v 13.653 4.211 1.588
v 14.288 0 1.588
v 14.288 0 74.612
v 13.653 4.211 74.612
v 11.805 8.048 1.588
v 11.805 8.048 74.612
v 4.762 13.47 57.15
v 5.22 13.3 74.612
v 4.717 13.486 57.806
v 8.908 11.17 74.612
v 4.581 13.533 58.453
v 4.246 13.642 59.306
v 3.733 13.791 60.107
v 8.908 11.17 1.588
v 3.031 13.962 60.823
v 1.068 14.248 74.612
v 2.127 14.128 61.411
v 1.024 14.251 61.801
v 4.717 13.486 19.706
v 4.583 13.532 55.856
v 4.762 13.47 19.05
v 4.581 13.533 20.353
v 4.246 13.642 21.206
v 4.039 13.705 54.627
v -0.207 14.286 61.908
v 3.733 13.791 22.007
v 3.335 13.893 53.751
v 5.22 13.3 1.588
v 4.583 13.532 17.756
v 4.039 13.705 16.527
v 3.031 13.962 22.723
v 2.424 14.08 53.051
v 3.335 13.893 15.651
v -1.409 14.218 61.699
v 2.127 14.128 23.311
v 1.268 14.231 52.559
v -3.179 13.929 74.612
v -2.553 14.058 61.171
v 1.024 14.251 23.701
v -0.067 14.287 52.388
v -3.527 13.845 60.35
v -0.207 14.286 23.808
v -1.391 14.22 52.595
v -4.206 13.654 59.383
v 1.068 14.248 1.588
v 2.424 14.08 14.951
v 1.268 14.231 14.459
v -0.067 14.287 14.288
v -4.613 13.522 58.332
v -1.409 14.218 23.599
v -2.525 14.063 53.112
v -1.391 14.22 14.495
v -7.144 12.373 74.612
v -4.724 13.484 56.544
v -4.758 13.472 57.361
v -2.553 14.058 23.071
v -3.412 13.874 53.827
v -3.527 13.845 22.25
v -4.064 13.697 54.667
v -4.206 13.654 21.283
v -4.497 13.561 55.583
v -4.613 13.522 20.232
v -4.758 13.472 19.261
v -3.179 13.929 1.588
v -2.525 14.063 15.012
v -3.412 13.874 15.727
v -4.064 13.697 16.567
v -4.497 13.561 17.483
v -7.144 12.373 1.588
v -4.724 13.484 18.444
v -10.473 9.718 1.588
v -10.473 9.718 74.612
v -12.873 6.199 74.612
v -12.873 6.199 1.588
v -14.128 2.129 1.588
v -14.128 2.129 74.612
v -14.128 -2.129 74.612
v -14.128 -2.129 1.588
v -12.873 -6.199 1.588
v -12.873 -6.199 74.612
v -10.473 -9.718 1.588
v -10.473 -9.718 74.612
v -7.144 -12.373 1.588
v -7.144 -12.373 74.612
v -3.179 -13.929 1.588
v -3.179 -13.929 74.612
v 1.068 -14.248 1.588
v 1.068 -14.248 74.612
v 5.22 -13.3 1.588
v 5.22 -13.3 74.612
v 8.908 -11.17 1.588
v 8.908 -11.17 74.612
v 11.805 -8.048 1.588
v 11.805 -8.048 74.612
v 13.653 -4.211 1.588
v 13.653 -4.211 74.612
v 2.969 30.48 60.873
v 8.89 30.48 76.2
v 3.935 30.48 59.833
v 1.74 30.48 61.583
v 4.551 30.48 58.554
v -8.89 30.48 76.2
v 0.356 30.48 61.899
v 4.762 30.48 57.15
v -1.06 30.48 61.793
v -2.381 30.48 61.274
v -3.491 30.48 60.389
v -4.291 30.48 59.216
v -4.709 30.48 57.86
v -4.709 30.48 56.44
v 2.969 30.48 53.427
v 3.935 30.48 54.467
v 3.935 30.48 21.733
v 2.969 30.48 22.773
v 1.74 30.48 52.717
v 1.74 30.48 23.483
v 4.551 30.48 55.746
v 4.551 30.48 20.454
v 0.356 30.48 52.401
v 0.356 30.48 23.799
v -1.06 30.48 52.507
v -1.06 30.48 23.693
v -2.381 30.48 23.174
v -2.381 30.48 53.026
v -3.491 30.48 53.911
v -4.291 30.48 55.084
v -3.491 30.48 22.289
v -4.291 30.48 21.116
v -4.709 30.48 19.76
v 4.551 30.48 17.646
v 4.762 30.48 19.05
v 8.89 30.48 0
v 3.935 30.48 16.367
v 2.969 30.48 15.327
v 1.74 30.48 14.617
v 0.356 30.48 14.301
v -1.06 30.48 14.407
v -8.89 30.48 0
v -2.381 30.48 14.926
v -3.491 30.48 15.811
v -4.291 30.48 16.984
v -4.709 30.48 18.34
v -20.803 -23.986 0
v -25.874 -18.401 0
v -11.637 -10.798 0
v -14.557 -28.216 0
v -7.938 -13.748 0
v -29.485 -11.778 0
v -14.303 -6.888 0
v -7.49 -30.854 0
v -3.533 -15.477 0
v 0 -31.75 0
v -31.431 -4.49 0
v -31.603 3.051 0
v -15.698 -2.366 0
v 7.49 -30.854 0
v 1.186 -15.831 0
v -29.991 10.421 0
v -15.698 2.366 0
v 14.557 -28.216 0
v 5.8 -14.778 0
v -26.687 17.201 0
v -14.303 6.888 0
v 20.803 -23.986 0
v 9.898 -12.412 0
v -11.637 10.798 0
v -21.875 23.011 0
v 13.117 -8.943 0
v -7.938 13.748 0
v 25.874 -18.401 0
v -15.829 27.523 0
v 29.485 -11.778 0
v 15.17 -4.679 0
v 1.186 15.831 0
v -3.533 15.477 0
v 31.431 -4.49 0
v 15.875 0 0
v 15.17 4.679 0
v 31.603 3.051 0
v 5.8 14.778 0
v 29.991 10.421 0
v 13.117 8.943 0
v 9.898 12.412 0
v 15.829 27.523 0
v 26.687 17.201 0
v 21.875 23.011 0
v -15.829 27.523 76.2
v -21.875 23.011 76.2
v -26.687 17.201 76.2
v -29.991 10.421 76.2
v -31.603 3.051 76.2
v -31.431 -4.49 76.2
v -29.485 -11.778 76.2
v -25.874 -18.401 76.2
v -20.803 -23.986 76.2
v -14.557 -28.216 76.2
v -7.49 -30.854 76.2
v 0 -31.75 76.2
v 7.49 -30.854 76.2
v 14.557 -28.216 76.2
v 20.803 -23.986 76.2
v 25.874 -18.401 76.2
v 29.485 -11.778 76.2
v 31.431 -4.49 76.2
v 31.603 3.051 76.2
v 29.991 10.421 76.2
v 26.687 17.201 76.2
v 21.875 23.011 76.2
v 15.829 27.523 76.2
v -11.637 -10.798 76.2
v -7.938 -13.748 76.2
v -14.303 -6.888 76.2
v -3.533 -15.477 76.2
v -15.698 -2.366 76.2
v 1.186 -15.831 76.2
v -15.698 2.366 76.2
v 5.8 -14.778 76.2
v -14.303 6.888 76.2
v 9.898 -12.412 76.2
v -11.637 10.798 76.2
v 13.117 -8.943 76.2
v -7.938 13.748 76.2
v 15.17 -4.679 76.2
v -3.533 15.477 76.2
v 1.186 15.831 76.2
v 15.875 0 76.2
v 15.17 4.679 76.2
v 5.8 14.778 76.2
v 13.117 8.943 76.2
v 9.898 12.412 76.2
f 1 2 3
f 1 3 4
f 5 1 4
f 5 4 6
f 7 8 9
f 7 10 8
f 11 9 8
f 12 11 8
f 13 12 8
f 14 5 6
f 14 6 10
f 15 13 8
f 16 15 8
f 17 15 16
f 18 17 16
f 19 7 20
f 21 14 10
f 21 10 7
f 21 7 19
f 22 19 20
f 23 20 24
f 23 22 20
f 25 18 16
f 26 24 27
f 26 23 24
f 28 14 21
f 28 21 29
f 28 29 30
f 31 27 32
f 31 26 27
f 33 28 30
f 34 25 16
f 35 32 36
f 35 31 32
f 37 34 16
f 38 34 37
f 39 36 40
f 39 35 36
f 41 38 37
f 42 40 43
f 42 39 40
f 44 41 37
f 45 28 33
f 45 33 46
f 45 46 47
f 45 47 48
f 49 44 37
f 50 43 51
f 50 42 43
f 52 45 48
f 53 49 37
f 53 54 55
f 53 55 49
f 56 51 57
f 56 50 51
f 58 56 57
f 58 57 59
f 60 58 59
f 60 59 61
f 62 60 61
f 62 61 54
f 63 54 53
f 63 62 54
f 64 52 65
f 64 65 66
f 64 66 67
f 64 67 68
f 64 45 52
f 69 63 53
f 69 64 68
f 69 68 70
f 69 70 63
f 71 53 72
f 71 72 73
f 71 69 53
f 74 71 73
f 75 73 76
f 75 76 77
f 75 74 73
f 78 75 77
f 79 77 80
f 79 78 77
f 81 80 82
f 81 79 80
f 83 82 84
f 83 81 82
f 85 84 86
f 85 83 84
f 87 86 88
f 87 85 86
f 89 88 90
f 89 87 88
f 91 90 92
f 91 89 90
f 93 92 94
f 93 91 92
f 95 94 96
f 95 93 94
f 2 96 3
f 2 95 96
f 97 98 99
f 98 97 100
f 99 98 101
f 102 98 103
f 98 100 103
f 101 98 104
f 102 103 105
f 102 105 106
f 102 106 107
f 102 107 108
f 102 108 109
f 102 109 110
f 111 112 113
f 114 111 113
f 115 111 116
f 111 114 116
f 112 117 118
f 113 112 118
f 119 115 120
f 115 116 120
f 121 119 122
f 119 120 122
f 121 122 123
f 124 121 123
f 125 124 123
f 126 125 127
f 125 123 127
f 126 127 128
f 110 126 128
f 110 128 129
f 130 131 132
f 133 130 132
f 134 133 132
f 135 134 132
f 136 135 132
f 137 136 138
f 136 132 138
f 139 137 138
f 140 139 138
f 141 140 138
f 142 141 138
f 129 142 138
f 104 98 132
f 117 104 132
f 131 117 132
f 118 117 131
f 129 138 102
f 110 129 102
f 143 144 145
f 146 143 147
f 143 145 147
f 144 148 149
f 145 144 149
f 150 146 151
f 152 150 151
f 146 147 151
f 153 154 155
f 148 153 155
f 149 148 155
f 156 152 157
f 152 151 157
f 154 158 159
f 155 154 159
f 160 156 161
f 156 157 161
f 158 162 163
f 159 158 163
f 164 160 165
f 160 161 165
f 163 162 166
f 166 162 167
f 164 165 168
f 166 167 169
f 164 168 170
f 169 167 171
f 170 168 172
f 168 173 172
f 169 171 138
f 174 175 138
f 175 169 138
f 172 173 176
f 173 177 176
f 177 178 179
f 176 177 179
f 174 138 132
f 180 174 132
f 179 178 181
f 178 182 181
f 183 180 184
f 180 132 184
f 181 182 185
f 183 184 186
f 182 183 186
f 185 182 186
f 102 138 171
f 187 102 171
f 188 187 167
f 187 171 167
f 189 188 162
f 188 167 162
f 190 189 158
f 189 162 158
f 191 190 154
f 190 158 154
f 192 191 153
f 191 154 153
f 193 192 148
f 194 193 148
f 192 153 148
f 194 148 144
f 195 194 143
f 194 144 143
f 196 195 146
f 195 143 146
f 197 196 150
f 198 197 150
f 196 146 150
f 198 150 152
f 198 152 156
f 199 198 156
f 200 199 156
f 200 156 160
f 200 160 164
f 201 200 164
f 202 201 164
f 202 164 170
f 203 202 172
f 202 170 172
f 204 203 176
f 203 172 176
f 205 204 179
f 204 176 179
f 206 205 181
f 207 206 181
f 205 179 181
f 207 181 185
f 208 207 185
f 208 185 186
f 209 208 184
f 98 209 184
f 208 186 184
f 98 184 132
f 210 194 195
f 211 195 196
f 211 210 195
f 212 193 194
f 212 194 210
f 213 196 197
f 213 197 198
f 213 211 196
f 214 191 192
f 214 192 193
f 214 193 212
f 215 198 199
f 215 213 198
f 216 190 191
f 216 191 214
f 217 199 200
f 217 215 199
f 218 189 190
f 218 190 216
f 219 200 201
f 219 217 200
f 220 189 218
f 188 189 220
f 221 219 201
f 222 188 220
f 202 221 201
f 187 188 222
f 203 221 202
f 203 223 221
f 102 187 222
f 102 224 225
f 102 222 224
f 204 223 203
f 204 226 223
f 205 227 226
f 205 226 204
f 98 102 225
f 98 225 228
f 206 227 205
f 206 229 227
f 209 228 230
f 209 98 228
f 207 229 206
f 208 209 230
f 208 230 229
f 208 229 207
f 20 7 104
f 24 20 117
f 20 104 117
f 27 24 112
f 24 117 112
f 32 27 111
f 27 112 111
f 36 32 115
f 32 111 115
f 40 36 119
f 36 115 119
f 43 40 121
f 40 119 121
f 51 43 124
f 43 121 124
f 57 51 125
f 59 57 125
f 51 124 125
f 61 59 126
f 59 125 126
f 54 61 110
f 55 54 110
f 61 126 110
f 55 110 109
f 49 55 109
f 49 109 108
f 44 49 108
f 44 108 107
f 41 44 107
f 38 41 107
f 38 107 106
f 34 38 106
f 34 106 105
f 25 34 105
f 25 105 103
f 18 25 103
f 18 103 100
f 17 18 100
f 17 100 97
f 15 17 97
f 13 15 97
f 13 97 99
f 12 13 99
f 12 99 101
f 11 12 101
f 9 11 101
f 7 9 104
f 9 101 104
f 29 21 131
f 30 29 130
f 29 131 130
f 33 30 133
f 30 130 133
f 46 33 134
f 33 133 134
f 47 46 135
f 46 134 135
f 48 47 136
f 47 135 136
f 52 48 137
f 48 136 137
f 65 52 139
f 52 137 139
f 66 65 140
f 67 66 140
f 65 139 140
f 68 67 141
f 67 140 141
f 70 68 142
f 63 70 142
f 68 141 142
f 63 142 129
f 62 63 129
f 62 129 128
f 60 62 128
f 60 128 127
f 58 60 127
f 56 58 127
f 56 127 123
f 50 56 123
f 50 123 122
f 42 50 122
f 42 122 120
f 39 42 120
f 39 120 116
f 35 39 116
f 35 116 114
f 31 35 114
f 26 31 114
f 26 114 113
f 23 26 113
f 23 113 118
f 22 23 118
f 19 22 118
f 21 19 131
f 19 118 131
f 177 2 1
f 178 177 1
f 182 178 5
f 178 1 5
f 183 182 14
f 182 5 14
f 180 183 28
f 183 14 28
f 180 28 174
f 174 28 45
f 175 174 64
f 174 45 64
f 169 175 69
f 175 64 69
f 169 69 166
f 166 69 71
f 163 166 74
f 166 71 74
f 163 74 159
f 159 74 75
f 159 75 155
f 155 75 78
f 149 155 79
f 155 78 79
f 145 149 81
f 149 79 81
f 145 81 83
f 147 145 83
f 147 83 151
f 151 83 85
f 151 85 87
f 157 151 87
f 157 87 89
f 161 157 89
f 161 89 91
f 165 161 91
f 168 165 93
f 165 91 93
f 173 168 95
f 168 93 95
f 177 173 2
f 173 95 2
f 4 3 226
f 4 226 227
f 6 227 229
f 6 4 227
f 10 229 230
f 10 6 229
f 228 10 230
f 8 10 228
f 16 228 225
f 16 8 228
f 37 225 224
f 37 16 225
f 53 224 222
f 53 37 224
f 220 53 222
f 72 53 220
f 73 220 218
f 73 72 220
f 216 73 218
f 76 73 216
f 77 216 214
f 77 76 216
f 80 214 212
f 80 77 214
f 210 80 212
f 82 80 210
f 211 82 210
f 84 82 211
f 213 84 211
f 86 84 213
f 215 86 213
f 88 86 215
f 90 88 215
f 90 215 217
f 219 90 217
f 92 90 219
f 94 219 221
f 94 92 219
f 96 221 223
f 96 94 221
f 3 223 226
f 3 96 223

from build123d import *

# Parameters (mm, degrees)
SKETCH1_R           = 14.2875
BOSS_EXTRUDE1_DEPTH = 76.2
CUT_EXTRUDE1_REACH  = 64.23
SKETCH2_R           = 4.7625
CHAMFER1_SIZE       = 1.5875


with BuildPart() as part:
    # Sketch1 → Boss-Extrude1 (new body)
    with BuildSketch(Plane.XY):
        with BuildLine():
            Line((8.89, 30.48), (-8.89, 30.48))
            ThreePointArc((-8.89, 30.48), (-19.05, -25.4), (31.75, 0))
            ThreePointArc((31.75, 0), (25.4, 19.05), (8.89, 30.48))
        make_face()
        Circle(SKETCH1_R, mode=Mode.SUBTRACT)
    extrude(amount=BOSS_EXTRUDE1_DEPTH)

    # Sketch2 → Cut-Extrude1 (cut, up to next)
    with BuildSketch(Plane(origin=(0, 30.48, 0), x_dir=(1, 0, 0), z_dir=(0, 1, 0)), mode=Mode.PRIVATE) as cut_extrude1_sk1:
        with Locations((0, -57.15)):
            Circle(SKETCH2_R)
    cut_extrude1_tool1 = extrude(cut_extrude1_sk1.sketch, amount=-CUT_EXTRUDE1_REACH, mode=Mode.PRIVATE) & part.part
    add(cut_extrude1_tool1.solids().sort_by_distance((0, 30.48, 57.15))[0], mode=Mode.SUBTRACT)
    # Sketch2 → Cut-Extrude1 (cut, up to next)
    with BuildSketch(Plane(origin=(0, 30.48, 0), x_dir=(1, 0, 0), z_dir=(0, 1, 0)), mode=Mode.PRIVATE) as cut_extrude1_sk2:
        with Locations((0, -19.05)):
            Circle(SKETCH2_R)
    cut_extrude1_tool2 = extrude(cut_extrude1_sk2.sketch, amount=-CUT_EXTRUDE1_REACH, mode=Mode.PRIVATE) & part.part
    add(cut_extrude1_tool2.solids().sort_by_distance((0, 30.48, 19.05))[0], mode=Mode.SUBTRACT)

    # Chamfer1
    chamfer1_edges = [part.edges().sort_by_distance(p)[0] for p in [
        (-14.2875, 0, 0),
        (-14.2875, 0, 76.2),
    ]]
    chamfer(chamfer1_edges, length=CHAMFER1_SIZE)


solid = part.part
